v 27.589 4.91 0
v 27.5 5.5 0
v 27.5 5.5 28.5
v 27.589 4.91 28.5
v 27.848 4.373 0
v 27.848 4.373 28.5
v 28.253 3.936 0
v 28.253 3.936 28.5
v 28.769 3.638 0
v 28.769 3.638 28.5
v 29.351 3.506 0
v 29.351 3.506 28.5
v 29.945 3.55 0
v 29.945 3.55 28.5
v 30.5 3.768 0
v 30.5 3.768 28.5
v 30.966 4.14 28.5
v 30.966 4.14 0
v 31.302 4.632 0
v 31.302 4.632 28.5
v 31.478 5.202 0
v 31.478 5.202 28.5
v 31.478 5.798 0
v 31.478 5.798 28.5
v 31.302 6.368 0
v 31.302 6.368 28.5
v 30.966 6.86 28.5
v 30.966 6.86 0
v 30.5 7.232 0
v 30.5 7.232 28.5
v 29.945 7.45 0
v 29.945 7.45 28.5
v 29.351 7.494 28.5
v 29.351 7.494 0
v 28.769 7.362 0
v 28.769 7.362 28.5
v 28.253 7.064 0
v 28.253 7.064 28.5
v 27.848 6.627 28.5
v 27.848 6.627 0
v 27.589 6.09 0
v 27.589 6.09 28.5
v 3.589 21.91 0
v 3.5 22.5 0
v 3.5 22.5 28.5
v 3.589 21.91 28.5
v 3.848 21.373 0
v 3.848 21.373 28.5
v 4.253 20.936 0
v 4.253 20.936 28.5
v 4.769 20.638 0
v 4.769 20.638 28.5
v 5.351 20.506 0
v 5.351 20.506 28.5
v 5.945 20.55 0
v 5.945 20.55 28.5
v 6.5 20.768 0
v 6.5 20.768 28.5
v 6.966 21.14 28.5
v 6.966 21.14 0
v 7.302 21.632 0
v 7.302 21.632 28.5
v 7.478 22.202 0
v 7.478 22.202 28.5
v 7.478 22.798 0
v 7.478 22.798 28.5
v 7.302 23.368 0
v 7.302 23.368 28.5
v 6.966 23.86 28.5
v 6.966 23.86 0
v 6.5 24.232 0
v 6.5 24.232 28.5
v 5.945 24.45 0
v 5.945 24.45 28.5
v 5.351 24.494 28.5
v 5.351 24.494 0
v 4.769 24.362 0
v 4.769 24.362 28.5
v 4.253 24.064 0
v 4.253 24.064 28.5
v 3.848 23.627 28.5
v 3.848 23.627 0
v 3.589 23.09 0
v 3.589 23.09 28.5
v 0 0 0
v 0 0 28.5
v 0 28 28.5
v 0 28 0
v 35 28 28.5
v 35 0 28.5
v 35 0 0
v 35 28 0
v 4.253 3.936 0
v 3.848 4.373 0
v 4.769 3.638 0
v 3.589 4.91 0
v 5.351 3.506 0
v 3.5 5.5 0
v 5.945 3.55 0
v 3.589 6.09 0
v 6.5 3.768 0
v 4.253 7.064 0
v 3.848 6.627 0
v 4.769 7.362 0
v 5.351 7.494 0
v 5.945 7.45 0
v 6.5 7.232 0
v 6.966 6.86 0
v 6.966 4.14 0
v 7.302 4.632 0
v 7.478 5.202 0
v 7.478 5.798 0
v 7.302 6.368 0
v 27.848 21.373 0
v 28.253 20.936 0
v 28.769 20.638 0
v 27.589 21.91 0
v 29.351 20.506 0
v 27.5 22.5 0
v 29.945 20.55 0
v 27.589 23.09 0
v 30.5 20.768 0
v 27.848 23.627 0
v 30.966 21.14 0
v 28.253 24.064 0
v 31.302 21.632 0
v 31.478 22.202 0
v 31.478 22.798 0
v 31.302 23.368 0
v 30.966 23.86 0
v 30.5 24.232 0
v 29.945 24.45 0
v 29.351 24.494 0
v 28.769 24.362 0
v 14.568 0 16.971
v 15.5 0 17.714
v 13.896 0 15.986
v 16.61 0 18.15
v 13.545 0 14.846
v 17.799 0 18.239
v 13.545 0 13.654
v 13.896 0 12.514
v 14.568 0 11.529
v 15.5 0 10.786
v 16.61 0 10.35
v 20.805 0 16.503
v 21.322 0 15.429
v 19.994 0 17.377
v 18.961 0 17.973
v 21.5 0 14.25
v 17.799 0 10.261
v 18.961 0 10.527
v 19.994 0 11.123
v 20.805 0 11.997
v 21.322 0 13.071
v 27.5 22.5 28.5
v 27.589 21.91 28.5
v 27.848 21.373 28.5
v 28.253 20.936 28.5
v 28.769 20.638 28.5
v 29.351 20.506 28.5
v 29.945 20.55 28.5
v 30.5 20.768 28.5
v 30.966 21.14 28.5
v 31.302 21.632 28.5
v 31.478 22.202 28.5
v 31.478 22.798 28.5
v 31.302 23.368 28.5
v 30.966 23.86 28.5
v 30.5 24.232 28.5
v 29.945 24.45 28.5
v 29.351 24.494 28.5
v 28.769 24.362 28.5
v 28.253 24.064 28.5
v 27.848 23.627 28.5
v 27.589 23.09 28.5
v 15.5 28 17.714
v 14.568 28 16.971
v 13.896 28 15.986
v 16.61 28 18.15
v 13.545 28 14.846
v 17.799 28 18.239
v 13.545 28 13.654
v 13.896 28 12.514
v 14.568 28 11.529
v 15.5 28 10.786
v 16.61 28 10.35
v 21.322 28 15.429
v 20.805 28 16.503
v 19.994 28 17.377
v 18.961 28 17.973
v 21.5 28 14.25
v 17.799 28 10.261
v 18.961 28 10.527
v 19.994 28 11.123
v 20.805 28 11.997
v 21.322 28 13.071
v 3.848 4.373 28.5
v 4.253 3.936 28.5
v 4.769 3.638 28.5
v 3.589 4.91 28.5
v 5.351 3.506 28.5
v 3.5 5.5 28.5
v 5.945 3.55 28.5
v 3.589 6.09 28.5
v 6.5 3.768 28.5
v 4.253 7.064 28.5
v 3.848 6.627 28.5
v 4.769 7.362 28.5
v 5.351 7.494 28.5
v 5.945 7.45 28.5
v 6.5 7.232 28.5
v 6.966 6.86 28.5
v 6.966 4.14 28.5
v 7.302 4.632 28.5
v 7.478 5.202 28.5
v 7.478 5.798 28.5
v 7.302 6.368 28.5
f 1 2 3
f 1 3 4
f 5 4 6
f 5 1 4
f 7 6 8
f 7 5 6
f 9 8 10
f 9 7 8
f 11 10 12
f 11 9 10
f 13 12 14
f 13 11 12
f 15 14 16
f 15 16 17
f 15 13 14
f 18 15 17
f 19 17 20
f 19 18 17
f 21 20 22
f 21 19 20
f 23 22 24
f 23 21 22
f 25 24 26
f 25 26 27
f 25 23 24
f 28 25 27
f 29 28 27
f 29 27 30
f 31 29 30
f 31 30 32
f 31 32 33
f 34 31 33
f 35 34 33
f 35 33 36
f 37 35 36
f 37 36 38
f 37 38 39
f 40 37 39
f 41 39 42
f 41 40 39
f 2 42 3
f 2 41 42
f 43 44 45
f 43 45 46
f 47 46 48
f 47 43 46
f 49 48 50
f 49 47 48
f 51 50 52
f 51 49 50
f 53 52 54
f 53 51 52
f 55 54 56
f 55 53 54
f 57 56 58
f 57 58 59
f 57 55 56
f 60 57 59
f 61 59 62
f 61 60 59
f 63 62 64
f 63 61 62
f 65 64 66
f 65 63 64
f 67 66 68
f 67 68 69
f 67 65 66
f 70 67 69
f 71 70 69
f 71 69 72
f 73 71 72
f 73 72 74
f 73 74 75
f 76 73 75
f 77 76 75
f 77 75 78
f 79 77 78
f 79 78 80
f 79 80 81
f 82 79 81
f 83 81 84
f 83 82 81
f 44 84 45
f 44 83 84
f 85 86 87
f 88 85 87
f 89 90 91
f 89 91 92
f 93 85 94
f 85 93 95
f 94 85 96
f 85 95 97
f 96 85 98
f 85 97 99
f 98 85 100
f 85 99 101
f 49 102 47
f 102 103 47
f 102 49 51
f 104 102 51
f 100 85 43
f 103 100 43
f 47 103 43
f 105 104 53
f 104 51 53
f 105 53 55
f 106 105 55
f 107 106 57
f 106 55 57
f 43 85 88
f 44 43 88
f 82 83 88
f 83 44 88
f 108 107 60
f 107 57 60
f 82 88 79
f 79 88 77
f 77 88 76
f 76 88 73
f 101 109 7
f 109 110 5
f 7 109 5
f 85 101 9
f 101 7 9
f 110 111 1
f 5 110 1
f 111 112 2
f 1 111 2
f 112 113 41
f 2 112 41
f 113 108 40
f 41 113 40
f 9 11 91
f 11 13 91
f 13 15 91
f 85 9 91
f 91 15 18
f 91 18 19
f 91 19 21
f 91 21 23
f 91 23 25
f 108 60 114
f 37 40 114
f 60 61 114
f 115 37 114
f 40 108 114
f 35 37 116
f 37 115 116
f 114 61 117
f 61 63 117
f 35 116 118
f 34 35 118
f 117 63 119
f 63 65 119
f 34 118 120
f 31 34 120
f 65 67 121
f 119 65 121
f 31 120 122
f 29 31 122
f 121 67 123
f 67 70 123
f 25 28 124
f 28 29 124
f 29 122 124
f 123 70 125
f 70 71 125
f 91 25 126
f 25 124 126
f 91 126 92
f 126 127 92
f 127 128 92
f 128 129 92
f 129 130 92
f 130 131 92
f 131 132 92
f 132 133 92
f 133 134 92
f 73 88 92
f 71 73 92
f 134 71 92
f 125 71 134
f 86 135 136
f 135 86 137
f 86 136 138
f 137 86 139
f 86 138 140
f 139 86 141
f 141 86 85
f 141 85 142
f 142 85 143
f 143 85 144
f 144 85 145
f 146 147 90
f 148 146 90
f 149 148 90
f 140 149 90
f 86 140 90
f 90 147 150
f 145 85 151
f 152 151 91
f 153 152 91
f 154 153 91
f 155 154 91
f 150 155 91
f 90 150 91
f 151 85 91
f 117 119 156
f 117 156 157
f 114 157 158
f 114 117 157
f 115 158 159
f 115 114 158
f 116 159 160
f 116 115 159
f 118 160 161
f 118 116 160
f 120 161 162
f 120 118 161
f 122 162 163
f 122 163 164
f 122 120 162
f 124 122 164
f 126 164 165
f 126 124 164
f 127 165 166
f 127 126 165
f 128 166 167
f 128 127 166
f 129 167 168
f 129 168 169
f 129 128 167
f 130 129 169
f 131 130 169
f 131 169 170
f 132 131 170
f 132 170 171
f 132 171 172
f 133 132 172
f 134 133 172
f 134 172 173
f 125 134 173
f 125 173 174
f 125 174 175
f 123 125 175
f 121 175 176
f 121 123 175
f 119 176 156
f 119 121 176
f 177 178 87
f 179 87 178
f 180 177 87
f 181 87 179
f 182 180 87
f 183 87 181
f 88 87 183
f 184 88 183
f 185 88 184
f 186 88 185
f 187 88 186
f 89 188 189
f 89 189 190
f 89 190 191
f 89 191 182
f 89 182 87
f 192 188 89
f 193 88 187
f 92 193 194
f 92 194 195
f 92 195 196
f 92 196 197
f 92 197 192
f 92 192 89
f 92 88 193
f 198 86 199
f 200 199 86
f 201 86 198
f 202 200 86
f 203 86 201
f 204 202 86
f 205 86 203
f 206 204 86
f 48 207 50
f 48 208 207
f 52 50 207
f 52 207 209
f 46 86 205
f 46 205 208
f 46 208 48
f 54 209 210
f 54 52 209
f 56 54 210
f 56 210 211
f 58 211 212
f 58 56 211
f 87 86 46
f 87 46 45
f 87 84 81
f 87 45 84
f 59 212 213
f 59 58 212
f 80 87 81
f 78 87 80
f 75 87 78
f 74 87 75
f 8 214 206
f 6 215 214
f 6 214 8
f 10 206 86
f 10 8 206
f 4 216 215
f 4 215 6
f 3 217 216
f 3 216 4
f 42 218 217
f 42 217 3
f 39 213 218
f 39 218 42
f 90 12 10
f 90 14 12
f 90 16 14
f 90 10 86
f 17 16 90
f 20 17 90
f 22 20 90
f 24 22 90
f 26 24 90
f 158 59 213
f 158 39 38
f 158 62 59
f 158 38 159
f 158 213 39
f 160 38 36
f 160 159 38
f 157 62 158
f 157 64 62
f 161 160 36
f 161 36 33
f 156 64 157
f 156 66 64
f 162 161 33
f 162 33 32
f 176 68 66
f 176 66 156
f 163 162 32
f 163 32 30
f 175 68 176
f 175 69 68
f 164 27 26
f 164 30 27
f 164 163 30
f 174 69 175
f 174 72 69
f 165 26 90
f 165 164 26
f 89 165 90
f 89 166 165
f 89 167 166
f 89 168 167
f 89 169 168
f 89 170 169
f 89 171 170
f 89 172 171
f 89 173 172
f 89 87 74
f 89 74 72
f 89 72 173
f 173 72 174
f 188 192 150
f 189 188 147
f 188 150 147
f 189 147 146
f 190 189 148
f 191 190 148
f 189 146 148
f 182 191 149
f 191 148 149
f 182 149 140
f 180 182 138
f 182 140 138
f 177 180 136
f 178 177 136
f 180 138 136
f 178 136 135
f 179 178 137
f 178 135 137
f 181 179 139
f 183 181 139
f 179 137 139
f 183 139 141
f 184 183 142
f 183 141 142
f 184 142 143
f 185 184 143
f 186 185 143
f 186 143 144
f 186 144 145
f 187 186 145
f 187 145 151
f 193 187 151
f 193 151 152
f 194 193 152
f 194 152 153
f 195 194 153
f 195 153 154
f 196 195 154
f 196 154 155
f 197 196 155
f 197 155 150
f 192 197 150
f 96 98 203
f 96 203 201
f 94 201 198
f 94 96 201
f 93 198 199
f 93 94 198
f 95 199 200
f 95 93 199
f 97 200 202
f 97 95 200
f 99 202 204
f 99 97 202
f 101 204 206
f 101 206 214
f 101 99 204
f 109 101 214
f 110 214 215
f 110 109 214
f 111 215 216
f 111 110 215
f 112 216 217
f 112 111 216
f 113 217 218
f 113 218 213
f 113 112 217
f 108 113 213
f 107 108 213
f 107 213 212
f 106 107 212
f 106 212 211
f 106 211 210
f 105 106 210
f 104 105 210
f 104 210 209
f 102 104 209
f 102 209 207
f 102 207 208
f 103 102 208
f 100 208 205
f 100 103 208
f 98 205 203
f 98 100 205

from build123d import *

# Parameters (mm, degrees)
SKETCH1_W           = 35
SKETCH1_H           = 28
SKETCH1_R           = 2
BOSS_EXTRUDE1_DEPTH = 28.5
SKETCH2_R           = 4
CUT_EXTRUDE1_DEPTH  = 54.115440316


with BuildPart() as part:
    # Sketch1 → Boss-Extrude1 (new body)
    with BuildSketch(Plane.XY):
        with Locations((17.5, 14)):
            Rectangle(SKETCH1_W, SKETCH1_H)
        with Locations(Location((5.5, 22.5, 0), (0, 0, 180))):
            Circle(SKETCH1_R, mode=Mode.SUBTRACT)
        with Locations(Location((29.5, 22.5, 0), (0, 0, 180))):
            Circle(SKETCH1_R, mode=Mode.SUBTRACT)
        with Locations(Location((5.5, 5.5, 0), (0, 0, 180))):
            Circle(SKETCH1_R, mode=Mode.SUBTRACT)
        with Locations(Location((29.5, 5.5, 0), (0, 0, 180))):
            Circle(SKETCH1_R, mode=Mode.SUBTRACT)
    extrude(amount=BOSS_EXTRUDE1_DEPTH)

    # Sketch2 → Cut-Extrude1 (cut, through all)
    with BuildSketch(Plane.XZ):
        with Locations((17.5, 14.25)):
            Circle(SKETCH2_R)
    extrude(amount=-CUT_EXTRUDE1_DEPTH, mode=Mode.SUBTRACT)


solid = part.part
